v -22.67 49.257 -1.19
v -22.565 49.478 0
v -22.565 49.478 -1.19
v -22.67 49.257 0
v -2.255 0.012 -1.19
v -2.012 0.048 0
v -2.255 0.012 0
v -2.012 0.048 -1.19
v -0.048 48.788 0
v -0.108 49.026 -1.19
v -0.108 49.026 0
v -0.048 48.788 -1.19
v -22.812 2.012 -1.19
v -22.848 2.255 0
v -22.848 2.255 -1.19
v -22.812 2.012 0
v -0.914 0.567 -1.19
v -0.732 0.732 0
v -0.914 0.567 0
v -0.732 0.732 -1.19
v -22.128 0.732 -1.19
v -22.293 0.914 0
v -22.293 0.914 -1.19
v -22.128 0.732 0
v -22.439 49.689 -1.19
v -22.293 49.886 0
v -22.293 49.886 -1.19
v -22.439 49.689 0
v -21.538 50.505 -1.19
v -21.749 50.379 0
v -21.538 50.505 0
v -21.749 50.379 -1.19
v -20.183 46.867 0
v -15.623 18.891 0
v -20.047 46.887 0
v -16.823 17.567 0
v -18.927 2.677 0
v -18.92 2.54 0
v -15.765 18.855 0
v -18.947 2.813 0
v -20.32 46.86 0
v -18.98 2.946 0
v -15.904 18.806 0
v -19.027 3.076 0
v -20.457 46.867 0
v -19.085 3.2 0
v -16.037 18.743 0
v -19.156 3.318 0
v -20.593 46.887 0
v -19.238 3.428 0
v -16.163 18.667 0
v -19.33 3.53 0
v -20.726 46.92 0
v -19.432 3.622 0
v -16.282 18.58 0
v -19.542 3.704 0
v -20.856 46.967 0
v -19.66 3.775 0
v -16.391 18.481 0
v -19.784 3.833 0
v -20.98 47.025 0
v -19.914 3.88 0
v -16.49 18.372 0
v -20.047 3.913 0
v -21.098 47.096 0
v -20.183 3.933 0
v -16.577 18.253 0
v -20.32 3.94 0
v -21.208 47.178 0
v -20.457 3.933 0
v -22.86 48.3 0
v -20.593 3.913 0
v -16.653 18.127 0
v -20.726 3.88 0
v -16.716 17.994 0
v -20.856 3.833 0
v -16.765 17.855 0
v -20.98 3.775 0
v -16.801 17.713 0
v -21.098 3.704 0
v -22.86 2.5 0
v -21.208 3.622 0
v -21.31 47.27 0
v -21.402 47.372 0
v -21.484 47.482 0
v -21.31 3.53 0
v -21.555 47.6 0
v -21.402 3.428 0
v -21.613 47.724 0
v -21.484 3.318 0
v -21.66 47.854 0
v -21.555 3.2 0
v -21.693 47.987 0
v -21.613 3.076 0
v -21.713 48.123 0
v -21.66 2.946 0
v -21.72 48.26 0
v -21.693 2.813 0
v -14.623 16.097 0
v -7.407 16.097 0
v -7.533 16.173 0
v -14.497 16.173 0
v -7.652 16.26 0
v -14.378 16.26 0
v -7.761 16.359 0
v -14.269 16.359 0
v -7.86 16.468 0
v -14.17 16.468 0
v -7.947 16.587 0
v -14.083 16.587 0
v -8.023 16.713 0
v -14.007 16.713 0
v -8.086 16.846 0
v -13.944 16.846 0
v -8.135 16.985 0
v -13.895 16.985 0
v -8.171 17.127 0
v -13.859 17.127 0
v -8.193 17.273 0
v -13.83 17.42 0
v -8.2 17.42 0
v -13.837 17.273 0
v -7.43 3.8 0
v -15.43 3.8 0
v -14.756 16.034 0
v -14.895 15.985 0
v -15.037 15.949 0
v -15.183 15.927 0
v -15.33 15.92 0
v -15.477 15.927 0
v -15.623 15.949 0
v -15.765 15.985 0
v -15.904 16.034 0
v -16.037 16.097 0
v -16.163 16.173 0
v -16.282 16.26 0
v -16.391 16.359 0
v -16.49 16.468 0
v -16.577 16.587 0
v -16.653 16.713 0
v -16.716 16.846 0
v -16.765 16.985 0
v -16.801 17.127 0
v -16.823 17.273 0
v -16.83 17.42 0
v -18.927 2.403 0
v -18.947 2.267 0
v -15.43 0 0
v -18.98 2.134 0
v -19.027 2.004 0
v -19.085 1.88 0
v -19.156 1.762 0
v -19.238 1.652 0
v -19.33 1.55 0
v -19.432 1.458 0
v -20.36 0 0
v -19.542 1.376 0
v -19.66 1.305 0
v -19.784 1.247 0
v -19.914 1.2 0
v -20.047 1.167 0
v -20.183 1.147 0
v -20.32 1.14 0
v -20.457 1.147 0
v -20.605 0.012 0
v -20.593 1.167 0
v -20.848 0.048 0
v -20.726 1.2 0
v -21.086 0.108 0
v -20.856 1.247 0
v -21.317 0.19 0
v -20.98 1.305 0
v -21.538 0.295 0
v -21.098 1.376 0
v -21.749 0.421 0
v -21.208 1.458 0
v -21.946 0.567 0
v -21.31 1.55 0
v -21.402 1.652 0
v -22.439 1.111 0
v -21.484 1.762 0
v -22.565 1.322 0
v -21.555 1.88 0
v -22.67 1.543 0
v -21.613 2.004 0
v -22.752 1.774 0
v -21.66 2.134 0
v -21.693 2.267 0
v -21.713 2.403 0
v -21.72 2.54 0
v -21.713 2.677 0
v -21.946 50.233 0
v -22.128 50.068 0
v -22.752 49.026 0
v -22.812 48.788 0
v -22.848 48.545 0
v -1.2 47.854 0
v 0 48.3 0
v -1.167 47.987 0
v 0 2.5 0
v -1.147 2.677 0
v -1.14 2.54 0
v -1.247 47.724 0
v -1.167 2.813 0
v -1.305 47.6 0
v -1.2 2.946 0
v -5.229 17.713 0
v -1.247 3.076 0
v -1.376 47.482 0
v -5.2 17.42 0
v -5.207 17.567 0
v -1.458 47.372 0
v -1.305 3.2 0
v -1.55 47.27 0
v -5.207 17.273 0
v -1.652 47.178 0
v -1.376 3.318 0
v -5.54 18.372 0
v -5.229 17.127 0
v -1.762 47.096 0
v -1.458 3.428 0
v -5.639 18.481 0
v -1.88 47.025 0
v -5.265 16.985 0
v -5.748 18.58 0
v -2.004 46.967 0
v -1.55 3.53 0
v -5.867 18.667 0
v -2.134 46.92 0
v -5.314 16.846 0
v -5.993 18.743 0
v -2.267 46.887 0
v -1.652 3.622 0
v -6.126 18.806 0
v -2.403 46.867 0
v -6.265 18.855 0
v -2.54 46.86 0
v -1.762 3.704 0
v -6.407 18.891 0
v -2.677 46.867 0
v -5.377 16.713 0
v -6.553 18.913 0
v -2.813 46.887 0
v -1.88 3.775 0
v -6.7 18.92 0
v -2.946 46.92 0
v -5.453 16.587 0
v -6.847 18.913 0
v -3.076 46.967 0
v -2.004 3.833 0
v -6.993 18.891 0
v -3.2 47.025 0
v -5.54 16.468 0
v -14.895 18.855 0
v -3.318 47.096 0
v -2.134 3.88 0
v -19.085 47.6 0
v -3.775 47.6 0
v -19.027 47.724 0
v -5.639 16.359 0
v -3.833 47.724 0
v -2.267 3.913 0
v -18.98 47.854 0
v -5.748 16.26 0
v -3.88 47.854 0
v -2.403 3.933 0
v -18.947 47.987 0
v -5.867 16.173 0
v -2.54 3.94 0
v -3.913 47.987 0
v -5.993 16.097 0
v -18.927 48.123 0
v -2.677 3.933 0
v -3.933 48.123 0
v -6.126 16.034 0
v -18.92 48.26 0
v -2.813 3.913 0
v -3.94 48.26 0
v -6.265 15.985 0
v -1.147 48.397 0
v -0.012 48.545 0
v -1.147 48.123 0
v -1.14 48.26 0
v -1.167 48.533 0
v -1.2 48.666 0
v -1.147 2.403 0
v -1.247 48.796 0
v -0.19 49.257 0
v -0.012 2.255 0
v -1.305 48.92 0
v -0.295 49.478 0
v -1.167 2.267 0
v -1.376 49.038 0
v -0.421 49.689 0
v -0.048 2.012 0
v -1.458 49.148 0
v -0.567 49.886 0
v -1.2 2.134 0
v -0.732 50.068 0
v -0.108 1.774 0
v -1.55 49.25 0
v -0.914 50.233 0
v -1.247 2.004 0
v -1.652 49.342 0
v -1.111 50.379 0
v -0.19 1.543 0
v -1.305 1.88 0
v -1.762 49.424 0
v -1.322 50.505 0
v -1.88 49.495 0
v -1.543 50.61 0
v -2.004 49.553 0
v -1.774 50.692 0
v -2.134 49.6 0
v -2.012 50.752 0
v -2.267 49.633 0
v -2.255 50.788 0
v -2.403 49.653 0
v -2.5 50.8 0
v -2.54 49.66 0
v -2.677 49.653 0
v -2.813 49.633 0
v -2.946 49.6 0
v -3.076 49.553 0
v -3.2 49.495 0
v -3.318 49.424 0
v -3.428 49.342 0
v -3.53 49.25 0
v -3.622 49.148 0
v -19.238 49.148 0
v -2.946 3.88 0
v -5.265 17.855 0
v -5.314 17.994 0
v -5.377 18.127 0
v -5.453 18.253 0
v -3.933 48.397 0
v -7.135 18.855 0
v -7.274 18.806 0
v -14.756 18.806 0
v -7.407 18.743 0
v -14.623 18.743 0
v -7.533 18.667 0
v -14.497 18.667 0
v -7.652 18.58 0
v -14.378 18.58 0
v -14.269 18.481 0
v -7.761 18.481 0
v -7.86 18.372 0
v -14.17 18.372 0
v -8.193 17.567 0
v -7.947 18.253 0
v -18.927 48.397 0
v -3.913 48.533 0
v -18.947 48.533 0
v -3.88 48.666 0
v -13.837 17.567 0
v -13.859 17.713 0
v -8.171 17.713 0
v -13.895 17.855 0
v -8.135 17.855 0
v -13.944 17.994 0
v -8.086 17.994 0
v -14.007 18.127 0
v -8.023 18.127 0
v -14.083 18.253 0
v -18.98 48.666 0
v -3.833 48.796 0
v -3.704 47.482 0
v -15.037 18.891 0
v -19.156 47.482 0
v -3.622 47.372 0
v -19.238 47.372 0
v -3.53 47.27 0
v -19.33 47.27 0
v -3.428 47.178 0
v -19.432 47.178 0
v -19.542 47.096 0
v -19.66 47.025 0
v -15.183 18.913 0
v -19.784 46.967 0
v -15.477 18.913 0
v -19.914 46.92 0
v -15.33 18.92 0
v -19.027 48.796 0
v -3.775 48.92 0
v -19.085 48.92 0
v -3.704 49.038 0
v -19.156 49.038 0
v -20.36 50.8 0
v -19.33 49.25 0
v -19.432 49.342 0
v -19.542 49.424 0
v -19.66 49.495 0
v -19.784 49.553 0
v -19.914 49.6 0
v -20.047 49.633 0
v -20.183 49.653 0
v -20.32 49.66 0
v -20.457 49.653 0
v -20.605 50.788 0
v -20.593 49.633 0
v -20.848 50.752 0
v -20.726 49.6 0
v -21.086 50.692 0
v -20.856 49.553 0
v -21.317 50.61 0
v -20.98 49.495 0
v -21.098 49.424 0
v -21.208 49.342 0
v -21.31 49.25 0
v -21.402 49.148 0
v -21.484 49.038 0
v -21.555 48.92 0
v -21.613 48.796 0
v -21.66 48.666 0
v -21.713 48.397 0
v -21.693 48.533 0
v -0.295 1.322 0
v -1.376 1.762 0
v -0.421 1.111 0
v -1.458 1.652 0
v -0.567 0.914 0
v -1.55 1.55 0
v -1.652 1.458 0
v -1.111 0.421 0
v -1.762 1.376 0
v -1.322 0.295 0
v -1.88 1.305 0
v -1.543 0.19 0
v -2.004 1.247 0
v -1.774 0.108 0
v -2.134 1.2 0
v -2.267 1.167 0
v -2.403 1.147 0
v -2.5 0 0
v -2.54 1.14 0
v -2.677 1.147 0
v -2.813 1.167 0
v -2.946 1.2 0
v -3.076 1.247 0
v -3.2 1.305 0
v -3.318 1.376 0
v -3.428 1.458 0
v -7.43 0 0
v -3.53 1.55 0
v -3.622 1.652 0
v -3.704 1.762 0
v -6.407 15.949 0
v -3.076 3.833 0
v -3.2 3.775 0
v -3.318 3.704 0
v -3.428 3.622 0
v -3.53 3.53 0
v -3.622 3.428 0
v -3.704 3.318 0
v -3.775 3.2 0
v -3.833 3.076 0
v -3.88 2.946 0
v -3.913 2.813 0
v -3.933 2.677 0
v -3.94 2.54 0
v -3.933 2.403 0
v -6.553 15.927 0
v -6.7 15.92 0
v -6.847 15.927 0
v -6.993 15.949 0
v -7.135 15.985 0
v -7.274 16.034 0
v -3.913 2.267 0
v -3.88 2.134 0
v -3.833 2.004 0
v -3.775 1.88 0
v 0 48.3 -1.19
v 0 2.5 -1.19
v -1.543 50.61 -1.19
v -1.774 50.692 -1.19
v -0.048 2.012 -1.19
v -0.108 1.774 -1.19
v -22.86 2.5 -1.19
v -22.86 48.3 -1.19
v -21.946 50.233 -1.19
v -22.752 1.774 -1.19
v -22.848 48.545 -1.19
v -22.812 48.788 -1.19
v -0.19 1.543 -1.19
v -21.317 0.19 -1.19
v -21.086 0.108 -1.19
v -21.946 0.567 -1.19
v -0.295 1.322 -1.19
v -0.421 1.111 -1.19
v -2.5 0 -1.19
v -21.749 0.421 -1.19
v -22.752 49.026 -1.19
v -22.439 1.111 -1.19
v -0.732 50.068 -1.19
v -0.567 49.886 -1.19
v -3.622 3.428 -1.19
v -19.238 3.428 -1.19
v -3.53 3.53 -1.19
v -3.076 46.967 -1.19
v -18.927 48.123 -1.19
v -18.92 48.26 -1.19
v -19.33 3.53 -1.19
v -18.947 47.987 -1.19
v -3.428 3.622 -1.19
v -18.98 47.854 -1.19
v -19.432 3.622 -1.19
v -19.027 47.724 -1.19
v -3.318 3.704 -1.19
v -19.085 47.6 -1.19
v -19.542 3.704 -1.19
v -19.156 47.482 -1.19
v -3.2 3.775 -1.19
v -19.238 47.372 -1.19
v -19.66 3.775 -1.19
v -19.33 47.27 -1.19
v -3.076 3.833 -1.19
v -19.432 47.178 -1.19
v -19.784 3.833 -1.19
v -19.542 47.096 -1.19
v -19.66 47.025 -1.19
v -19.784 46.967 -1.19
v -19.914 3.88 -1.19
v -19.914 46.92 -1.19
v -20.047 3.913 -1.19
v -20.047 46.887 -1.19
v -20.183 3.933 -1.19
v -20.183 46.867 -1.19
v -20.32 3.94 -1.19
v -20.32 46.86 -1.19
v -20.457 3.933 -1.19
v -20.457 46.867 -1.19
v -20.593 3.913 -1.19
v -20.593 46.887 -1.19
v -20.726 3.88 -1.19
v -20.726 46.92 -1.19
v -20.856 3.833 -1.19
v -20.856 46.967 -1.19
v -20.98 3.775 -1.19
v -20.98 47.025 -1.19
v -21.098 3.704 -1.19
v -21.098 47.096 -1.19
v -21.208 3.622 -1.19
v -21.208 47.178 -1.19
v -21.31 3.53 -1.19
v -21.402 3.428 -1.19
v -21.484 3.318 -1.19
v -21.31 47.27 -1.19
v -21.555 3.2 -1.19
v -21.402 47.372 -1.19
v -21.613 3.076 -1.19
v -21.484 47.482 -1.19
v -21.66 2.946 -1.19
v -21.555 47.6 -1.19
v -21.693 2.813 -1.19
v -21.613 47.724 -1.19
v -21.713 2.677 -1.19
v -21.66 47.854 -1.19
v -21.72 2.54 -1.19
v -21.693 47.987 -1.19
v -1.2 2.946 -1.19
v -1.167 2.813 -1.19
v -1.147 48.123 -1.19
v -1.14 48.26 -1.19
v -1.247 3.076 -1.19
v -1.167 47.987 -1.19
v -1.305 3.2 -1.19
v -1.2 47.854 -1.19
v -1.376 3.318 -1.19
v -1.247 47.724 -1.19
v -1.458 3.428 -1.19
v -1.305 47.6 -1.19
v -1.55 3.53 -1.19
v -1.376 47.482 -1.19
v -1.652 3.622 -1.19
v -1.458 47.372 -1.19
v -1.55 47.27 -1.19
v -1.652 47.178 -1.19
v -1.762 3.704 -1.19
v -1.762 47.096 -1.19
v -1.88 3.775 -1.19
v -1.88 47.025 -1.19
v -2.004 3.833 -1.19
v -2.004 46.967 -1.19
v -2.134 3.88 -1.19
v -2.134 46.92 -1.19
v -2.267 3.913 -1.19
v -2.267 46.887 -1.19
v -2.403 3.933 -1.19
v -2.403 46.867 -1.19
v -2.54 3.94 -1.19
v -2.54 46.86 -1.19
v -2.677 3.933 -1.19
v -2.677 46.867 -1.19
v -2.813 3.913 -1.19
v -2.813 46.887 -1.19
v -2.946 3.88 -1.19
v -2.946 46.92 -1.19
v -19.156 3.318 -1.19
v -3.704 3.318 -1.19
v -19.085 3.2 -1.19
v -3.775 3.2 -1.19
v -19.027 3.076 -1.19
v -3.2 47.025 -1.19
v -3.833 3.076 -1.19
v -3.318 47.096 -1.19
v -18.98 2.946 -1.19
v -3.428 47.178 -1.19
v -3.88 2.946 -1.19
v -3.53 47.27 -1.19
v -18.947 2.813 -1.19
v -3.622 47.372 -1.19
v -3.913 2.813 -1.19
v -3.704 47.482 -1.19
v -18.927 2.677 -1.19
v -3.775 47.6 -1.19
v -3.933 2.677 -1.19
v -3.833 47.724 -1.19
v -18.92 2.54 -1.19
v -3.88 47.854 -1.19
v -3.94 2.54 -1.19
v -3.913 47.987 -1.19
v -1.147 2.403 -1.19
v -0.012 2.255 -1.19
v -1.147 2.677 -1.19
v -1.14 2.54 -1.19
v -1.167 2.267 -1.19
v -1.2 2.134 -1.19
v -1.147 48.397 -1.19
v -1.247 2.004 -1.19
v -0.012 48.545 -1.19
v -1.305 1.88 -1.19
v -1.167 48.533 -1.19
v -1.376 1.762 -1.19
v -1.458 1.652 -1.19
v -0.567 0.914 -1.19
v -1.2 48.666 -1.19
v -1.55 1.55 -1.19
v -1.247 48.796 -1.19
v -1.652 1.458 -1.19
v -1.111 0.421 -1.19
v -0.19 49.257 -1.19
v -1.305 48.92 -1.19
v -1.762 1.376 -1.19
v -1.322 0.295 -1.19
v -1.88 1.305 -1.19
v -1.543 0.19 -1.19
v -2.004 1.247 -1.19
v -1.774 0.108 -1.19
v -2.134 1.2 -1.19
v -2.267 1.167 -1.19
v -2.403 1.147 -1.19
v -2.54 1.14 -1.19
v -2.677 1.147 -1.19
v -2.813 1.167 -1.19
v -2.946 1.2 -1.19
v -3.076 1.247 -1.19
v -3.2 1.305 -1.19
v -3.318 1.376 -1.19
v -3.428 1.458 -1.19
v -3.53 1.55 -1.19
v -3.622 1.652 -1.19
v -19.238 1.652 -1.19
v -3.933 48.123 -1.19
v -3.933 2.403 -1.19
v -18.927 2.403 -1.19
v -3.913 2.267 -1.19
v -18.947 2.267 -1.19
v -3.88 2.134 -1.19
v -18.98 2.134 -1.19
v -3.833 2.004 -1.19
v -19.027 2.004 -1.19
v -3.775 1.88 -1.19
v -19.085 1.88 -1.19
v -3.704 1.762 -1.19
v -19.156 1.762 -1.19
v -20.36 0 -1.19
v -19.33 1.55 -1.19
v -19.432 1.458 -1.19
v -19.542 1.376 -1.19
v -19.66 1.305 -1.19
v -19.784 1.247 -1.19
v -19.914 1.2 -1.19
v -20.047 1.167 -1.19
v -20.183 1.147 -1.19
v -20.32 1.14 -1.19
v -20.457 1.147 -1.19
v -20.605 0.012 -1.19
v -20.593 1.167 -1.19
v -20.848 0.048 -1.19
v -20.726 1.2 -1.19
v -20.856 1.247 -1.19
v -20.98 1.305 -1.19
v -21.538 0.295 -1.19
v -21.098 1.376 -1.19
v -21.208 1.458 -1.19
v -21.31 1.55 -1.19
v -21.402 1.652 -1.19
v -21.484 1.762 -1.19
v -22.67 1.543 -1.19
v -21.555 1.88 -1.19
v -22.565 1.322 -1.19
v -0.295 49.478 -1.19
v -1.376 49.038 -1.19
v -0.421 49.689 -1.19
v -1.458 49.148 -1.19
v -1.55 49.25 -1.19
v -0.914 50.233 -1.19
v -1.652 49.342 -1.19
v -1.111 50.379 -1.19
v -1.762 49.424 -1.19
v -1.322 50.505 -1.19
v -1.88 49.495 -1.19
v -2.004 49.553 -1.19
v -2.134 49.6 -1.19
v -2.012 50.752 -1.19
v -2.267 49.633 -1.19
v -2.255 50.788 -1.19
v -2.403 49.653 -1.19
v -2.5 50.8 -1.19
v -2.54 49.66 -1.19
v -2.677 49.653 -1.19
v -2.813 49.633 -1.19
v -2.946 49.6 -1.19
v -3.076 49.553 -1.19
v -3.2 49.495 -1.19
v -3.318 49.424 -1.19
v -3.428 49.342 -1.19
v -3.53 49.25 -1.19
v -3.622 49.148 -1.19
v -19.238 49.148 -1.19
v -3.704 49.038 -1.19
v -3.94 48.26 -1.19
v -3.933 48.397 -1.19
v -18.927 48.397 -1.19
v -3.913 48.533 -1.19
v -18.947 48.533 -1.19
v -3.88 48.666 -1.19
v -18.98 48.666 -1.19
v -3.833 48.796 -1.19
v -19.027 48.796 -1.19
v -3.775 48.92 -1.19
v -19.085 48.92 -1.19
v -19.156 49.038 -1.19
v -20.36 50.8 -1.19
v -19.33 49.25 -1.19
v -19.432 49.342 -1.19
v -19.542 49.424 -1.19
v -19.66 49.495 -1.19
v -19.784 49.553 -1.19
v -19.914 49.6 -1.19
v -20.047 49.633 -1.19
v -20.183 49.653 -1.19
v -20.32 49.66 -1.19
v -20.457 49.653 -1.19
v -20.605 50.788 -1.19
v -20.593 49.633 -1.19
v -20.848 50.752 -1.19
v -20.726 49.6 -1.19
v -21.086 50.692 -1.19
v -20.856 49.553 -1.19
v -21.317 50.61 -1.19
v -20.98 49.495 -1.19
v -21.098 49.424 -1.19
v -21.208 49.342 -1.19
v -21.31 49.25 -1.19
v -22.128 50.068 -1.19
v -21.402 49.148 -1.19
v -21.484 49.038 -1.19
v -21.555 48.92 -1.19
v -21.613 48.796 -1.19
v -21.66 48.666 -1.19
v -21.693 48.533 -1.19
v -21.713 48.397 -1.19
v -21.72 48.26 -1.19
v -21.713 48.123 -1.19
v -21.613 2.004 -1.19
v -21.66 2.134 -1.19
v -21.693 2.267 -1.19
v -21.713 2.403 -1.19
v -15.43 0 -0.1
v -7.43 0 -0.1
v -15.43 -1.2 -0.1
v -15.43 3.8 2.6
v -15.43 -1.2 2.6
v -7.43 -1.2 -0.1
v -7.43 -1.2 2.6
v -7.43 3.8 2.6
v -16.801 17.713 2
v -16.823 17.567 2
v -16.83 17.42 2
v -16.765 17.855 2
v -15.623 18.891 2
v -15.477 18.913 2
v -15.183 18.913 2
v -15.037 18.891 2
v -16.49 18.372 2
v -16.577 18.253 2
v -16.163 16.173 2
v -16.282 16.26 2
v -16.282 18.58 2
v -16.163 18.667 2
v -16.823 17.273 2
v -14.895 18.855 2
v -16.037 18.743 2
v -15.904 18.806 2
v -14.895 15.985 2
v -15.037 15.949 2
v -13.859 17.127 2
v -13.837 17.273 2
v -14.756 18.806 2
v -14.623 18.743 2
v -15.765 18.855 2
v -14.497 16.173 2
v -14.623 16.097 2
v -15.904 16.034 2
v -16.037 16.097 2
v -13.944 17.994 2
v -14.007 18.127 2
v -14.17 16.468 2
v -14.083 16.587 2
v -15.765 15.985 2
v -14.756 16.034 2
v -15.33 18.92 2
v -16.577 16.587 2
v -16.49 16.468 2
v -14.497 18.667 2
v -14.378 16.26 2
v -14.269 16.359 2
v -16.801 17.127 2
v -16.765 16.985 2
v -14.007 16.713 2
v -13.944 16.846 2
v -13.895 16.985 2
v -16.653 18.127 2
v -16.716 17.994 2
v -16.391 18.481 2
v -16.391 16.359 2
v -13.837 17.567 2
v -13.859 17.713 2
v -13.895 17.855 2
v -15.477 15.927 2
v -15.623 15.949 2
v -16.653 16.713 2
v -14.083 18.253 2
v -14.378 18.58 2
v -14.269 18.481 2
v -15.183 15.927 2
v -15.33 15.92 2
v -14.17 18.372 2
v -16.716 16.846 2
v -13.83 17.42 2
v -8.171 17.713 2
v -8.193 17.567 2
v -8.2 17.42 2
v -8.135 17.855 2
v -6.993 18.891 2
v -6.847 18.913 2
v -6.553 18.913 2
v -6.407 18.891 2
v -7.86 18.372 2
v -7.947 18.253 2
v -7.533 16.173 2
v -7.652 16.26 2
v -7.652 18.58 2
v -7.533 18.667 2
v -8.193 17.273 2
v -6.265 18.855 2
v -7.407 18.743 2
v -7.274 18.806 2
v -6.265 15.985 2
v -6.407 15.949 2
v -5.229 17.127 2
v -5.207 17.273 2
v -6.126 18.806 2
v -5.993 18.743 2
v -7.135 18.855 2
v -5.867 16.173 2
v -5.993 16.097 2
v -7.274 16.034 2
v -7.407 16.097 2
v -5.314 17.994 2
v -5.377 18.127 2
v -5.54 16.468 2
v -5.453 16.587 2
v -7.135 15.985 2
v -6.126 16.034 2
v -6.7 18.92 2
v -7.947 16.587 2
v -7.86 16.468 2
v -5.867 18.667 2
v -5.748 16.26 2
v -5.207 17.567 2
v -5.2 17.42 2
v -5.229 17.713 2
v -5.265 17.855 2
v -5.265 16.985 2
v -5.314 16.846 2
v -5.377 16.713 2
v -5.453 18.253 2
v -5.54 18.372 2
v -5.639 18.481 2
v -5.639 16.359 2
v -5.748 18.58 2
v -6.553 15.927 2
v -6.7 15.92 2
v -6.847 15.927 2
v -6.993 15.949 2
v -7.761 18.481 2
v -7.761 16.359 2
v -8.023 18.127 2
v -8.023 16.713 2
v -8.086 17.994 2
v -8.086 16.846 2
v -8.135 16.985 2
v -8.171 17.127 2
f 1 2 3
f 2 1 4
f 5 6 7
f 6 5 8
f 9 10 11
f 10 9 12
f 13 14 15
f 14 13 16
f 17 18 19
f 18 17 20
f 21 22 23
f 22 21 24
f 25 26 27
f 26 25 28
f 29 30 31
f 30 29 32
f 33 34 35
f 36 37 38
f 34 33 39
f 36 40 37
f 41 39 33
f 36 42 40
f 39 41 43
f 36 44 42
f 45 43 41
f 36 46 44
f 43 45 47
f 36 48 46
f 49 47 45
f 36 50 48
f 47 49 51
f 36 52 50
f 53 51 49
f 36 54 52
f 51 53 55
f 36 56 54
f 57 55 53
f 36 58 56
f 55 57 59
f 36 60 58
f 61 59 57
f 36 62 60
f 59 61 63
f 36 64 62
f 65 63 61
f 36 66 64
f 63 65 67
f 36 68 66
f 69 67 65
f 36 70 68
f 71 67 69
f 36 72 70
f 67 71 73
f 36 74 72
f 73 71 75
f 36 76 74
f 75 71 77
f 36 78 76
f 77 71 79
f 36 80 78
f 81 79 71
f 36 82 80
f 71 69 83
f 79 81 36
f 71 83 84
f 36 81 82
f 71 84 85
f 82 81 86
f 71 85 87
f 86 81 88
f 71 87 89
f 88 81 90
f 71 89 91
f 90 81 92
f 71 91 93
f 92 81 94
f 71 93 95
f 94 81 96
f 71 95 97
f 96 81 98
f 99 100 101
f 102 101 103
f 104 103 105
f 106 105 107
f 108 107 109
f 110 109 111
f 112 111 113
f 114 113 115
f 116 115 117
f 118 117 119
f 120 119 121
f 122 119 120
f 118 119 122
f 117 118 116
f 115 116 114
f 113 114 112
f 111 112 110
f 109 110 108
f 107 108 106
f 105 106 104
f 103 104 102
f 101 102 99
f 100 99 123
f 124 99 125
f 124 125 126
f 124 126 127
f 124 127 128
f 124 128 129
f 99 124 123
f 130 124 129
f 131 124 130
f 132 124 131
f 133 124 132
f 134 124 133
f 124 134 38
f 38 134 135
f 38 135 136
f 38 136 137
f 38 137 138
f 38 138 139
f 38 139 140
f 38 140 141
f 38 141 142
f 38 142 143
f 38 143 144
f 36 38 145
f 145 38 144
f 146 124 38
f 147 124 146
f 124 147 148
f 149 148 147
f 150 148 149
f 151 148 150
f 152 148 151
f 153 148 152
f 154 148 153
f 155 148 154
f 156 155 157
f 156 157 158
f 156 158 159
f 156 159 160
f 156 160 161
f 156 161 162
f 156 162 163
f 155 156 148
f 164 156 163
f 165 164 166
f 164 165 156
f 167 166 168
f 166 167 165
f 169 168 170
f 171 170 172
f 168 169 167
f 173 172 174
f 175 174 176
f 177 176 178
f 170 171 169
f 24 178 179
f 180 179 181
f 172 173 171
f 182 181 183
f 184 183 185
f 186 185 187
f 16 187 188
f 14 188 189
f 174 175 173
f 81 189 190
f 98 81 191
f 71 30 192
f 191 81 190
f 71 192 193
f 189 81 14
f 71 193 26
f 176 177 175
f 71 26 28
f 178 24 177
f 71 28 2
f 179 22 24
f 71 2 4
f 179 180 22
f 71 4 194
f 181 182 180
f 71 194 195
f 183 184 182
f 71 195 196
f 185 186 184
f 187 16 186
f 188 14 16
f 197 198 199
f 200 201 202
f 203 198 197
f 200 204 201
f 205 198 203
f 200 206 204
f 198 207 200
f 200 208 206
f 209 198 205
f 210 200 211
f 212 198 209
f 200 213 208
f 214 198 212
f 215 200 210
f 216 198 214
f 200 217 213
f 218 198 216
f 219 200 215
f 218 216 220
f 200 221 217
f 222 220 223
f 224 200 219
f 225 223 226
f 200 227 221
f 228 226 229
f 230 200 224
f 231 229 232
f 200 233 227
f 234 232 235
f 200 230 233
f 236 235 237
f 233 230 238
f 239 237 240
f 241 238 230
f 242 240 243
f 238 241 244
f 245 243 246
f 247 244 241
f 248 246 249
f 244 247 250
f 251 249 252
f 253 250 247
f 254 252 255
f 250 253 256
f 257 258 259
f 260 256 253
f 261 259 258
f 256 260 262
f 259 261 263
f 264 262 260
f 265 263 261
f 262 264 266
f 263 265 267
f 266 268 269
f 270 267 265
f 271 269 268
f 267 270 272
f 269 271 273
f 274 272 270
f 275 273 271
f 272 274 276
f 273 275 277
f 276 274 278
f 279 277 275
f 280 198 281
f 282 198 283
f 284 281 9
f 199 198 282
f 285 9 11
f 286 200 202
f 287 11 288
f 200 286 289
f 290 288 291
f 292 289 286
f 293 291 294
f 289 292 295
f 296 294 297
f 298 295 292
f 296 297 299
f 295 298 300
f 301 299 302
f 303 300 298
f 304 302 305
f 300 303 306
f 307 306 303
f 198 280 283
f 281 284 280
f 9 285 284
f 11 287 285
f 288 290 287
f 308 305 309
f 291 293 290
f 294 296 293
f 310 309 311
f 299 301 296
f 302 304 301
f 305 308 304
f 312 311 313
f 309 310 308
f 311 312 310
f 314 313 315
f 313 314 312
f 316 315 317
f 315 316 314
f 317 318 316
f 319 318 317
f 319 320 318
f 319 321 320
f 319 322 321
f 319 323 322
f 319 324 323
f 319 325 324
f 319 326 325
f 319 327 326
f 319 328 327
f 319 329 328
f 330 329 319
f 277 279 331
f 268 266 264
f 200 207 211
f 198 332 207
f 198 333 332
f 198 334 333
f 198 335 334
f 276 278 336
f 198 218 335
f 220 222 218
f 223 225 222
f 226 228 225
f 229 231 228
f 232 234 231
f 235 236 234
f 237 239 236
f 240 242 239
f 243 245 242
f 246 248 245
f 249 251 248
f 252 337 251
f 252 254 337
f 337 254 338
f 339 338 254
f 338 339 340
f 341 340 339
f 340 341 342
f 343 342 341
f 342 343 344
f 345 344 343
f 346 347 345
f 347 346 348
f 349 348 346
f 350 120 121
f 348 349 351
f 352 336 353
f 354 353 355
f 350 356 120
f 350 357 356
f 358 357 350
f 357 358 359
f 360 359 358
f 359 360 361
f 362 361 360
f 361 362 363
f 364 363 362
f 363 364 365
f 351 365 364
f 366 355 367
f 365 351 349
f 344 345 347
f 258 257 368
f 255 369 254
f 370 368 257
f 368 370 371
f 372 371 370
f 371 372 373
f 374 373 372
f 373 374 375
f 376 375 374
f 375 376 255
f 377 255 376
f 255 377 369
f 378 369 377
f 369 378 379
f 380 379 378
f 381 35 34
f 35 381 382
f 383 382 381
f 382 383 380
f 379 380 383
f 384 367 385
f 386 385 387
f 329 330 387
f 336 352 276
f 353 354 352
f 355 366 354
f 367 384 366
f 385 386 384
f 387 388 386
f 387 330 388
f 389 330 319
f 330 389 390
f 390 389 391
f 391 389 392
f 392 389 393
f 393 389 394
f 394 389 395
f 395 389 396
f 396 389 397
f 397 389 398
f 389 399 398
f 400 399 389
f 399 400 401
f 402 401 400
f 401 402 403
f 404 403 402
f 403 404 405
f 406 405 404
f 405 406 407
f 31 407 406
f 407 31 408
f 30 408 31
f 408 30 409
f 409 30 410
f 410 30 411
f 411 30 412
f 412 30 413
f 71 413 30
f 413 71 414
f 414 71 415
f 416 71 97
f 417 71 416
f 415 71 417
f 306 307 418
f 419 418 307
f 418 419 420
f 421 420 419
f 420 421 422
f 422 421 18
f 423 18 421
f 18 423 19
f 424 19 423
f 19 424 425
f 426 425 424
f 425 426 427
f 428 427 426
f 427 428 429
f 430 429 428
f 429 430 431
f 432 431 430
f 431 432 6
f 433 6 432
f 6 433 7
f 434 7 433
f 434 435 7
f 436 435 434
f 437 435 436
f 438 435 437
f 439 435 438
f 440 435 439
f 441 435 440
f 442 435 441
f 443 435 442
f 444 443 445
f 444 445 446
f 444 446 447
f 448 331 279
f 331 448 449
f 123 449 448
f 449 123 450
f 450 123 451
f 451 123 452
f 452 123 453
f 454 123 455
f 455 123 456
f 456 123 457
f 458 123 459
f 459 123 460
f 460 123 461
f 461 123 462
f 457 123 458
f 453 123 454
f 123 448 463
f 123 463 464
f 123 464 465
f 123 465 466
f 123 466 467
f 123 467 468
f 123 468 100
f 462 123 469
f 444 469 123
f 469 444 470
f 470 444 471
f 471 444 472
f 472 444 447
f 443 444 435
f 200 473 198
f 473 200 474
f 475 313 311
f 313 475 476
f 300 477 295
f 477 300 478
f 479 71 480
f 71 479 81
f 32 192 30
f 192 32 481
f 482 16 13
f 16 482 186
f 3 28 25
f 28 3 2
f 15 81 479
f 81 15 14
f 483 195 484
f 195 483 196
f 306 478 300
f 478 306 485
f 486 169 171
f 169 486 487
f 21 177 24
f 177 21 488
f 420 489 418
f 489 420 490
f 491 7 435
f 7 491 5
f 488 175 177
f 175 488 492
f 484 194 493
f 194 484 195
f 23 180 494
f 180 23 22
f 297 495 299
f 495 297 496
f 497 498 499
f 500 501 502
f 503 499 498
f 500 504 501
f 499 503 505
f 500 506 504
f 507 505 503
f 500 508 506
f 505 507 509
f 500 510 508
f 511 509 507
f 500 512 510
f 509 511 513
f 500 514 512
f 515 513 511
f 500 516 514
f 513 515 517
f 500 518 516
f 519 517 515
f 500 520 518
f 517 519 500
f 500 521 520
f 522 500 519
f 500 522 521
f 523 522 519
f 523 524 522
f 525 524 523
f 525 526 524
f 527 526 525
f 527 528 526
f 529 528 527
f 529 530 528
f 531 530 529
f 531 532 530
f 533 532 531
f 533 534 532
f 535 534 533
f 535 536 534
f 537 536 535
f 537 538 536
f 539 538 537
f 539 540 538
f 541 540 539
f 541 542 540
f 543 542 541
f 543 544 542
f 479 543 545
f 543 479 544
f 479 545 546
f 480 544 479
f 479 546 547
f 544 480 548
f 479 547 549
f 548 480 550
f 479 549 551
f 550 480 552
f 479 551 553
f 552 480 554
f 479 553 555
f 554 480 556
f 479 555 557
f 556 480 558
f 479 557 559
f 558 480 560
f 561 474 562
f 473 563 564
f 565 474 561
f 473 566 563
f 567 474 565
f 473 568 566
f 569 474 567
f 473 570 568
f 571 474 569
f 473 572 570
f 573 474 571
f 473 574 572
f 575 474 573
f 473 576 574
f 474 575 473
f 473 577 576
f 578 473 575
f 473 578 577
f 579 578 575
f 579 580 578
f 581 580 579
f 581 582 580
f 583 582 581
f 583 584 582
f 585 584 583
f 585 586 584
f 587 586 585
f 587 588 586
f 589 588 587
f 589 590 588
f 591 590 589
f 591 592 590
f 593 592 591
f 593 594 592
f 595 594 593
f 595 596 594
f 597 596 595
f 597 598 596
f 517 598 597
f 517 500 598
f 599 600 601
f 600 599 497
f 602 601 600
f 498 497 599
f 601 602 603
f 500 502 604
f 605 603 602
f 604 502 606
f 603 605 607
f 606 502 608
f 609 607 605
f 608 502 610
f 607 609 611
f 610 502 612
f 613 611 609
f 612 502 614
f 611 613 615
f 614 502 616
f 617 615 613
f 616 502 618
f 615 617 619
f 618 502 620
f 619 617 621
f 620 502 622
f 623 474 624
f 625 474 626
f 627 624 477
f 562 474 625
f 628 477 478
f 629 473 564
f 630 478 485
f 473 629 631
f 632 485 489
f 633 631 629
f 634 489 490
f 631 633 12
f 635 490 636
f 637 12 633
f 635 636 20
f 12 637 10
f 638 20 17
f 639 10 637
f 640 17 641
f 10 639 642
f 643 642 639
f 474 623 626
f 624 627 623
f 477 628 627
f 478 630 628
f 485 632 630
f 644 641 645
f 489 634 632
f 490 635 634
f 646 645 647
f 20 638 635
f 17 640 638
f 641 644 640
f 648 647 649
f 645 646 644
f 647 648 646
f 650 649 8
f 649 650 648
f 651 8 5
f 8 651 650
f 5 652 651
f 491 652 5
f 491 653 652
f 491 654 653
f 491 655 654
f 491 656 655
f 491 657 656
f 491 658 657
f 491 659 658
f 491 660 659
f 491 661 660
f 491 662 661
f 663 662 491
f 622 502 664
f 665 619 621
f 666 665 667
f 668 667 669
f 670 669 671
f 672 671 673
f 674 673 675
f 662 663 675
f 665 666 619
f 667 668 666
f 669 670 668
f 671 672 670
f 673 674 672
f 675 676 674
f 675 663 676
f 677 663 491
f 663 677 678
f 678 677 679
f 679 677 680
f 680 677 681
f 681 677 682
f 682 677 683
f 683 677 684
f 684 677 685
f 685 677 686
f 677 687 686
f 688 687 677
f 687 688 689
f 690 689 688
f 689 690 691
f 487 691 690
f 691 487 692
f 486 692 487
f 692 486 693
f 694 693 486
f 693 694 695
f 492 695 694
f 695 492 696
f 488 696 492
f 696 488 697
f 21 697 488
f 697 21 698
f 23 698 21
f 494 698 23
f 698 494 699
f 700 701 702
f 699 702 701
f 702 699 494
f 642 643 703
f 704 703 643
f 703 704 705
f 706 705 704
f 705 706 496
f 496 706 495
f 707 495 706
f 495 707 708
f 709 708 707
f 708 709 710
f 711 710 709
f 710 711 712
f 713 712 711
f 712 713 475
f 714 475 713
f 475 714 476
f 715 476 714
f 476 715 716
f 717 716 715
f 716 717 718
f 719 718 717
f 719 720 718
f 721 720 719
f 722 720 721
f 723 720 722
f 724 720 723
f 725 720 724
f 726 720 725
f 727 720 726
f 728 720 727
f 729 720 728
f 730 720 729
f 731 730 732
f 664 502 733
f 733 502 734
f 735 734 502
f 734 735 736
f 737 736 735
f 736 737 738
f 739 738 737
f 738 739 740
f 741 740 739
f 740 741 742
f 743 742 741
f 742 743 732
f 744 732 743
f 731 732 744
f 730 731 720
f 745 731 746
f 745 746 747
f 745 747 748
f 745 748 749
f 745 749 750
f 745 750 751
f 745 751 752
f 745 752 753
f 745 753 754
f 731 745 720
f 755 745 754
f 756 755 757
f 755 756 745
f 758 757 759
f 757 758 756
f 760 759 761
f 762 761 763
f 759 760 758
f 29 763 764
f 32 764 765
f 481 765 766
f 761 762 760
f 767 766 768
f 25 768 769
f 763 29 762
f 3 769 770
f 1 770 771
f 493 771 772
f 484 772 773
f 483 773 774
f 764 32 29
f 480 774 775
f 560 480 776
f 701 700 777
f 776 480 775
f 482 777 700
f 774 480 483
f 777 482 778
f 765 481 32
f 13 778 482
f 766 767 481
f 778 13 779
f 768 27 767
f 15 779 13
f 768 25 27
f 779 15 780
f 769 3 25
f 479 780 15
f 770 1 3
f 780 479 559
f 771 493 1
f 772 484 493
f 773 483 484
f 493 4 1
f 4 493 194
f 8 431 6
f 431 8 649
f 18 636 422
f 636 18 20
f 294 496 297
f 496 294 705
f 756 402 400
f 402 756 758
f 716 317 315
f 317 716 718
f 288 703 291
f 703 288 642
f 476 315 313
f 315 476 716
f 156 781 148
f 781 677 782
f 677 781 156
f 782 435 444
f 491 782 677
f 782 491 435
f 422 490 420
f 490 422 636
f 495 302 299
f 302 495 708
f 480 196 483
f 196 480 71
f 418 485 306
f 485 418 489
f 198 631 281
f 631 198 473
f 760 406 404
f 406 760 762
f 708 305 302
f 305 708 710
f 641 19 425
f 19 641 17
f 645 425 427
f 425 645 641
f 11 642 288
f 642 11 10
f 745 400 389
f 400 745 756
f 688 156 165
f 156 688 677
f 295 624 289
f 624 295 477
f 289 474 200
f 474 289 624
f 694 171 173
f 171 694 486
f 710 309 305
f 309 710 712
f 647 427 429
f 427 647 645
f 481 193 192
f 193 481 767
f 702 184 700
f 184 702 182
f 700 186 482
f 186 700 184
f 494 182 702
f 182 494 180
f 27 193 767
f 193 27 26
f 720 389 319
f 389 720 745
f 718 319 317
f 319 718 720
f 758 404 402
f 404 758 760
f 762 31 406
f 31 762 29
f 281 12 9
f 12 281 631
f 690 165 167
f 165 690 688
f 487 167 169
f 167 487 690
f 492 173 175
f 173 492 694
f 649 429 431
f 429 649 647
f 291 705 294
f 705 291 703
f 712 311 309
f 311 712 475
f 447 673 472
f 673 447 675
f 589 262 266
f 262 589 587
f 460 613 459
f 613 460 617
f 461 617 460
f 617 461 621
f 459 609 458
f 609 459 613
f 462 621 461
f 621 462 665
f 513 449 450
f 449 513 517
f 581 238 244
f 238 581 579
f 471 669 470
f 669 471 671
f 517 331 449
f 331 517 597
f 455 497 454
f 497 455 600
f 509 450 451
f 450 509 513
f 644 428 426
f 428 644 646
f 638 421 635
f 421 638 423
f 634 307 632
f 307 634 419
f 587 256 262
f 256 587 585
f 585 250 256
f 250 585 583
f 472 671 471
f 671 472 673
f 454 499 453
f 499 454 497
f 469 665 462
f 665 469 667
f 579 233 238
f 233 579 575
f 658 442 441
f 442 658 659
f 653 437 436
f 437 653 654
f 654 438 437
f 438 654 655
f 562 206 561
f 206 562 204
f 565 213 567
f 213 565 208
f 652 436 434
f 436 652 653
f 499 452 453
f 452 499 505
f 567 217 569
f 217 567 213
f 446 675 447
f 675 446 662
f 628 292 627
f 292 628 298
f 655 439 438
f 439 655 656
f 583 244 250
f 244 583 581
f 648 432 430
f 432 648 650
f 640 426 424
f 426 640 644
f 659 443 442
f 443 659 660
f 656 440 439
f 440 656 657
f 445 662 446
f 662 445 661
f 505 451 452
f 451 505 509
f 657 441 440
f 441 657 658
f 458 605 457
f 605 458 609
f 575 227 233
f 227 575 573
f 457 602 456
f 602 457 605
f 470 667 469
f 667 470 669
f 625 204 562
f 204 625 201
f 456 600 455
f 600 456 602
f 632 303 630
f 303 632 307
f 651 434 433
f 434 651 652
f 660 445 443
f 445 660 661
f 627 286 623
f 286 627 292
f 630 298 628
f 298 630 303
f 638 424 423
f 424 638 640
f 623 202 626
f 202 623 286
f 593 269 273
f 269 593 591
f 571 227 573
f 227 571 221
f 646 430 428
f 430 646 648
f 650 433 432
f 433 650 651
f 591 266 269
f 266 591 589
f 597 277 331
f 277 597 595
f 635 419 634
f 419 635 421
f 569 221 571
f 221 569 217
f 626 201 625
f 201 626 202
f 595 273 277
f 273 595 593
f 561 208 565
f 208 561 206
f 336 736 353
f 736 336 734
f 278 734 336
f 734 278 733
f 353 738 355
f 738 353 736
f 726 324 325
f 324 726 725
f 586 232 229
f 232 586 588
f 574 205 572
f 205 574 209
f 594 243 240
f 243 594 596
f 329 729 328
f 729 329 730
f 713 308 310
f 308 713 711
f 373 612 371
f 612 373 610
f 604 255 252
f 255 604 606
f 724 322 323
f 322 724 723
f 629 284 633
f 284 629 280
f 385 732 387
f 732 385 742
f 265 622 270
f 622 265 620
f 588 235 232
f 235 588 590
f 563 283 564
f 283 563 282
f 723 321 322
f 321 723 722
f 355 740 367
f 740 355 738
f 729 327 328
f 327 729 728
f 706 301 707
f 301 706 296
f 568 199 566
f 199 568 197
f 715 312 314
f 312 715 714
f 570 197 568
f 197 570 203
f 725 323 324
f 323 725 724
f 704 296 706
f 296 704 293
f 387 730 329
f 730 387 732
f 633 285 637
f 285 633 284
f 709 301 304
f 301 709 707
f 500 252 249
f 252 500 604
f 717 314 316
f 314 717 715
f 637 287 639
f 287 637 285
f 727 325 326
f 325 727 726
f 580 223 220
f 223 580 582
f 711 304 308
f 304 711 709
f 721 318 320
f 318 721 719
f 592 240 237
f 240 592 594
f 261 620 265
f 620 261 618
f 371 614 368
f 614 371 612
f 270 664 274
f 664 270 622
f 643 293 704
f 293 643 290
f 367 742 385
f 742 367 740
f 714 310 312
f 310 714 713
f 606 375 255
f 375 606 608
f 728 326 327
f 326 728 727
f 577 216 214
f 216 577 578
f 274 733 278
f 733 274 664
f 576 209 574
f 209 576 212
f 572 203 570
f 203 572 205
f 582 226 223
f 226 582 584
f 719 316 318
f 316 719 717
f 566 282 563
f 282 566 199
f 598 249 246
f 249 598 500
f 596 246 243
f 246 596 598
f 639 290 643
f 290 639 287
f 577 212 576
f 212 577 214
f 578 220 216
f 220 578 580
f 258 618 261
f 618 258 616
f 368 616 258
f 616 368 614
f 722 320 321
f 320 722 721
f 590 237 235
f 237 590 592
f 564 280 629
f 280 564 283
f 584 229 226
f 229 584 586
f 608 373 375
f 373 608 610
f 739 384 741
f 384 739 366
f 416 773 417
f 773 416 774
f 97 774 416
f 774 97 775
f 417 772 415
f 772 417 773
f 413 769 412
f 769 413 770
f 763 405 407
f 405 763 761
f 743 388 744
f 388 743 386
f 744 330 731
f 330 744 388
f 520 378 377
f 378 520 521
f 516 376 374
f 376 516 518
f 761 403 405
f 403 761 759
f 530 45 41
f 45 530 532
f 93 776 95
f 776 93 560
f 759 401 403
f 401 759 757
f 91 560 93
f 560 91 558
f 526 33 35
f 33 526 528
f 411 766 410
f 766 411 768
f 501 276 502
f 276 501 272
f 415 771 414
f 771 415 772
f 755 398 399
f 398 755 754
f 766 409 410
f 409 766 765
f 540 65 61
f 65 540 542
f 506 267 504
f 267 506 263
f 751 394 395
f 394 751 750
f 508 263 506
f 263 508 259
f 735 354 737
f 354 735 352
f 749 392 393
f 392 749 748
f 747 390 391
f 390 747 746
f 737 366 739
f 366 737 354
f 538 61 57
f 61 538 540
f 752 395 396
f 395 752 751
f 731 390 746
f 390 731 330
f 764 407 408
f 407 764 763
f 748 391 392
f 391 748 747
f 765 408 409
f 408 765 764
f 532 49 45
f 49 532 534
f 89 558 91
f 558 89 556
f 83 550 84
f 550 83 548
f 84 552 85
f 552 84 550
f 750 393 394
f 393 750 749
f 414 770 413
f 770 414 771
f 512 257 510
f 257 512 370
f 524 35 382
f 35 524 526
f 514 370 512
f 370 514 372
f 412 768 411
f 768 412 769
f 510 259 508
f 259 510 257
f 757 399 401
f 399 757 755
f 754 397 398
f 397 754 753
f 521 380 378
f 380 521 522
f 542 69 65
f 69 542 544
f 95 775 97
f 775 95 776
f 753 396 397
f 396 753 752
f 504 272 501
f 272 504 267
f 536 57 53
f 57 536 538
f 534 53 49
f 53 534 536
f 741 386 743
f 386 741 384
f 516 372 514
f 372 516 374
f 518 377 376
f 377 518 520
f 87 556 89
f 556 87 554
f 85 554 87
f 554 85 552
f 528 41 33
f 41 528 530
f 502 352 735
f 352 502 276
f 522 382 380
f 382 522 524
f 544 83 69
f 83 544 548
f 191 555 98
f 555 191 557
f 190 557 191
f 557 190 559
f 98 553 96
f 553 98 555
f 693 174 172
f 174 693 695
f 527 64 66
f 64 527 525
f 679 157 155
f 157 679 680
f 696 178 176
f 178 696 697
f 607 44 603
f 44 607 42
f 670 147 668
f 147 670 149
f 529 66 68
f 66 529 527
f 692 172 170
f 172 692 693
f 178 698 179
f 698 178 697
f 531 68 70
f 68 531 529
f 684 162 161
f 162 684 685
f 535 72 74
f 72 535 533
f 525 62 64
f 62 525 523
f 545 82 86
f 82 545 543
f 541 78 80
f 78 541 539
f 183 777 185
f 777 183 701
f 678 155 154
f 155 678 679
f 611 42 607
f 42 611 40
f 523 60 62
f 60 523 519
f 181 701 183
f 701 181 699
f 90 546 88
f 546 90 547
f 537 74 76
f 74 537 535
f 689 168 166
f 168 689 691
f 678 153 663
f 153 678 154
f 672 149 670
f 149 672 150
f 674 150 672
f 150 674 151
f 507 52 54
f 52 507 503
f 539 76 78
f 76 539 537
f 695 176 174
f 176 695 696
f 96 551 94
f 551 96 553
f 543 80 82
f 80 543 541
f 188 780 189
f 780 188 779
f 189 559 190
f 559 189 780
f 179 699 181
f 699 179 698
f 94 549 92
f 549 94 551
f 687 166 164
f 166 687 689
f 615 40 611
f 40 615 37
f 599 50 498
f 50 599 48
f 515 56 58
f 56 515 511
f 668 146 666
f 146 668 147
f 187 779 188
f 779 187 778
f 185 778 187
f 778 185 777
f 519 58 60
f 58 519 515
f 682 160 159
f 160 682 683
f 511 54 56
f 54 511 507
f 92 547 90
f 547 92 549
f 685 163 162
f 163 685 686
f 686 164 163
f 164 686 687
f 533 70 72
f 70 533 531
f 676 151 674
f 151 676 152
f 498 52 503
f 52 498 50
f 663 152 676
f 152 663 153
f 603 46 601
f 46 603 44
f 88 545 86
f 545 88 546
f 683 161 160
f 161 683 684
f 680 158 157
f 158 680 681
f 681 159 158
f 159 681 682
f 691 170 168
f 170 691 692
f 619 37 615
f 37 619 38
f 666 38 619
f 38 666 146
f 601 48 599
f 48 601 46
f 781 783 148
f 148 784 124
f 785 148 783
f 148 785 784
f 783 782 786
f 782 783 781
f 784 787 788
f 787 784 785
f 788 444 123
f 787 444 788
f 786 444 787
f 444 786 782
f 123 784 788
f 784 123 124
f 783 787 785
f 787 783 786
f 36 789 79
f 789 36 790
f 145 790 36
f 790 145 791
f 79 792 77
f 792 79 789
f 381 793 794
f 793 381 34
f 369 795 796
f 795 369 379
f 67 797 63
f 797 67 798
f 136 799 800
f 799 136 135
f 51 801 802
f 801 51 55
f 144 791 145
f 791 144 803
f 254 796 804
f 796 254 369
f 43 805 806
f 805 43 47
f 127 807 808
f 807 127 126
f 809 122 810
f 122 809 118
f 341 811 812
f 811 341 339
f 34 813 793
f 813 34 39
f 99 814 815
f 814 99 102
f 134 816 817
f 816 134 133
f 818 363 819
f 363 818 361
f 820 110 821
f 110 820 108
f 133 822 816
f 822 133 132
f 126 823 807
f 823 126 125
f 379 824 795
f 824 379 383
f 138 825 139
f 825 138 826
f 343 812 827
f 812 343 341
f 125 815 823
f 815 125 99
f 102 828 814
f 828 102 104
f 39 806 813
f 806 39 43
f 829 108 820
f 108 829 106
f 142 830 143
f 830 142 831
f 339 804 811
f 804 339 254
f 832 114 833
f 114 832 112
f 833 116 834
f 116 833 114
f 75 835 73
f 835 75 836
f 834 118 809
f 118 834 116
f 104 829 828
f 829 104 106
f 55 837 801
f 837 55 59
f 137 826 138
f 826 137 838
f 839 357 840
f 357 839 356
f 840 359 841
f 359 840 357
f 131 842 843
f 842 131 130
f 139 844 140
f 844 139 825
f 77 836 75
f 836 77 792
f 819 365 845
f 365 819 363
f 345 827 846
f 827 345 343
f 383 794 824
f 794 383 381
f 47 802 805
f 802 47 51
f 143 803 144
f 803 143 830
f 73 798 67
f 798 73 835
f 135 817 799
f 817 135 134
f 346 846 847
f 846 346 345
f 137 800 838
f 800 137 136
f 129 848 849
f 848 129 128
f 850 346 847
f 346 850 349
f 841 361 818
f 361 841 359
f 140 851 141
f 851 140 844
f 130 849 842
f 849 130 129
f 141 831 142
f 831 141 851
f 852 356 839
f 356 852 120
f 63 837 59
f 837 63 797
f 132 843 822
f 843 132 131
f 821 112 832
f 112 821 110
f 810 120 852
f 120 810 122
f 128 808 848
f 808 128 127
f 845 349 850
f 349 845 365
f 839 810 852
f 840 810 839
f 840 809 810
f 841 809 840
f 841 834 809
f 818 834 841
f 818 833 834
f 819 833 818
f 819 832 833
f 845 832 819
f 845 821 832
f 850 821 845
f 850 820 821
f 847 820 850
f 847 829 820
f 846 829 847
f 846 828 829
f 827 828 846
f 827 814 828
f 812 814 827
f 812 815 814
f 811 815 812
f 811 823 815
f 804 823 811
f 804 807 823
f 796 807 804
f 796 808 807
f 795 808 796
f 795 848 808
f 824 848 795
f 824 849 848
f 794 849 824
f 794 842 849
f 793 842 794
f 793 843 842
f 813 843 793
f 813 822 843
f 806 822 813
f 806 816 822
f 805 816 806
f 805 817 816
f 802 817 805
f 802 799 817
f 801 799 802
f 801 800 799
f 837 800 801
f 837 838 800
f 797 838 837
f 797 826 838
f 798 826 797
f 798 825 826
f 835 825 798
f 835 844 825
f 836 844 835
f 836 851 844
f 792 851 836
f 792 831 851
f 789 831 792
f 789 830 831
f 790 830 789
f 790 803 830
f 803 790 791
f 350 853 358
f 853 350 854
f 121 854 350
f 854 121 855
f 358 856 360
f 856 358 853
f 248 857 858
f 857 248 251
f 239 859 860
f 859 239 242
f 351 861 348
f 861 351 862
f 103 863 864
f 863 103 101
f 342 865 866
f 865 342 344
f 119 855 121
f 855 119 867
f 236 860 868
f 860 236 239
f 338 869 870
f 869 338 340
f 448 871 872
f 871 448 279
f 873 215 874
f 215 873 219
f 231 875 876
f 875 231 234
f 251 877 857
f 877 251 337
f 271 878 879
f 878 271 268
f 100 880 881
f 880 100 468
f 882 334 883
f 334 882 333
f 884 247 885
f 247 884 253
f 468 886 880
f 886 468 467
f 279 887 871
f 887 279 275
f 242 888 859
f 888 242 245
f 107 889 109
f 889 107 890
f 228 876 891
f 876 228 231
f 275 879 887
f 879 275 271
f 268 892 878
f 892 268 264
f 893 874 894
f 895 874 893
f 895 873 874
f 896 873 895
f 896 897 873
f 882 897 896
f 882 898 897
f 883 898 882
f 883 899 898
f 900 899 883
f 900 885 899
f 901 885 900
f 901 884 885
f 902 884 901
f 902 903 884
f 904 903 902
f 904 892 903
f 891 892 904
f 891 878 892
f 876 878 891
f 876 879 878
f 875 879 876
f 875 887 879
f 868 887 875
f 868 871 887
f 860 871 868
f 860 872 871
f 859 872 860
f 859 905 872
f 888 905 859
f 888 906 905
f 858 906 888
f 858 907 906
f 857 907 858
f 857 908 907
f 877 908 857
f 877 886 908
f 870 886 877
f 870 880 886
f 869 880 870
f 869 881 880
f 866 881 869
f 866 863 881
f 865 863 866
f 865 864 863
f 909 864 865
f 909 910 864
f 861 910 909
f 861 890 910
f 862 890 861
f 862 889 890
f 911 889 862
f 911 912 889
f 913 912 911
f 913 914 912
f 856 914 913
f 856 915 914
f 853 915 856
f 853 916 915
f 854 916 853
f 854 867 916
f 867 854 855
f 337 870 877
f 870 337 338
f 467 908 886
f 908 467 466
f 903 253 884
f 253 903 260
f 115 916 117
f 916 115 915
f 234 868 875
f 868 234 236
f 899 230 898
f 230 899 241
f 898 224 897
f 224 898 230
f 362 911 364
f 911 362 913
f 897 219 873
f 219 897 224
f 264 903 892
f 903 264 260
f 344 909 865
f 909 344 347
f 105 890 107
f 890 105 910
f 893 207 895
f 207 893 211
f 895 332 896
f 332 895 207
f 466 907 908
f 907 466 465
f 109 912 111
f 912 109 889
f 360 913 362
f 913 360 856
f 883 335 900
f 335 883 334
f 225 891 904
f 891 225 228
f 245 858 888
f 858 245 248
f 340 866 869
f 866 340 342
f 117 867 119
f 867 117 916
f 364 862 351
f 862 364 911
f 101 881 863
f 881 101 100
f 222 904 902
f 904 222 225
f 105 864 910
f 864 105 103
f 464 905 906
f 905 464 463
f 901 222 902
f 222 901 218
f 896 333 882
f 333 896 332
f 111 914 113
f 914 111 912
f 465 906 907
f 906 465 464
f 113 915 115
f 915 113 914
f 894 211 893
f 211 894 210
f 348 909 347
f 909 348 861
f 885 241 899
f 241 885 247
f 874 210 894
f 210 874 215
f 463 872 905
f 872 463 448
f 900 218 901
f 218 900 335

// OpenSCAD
$fn = 64; // curved resolution (used for cylinders and spheres)

rotate(180,[0,1,0]) featherBoard();

// Featherboard with usb
module featherBoard() {
    difference() {
        // PCB
        rcube([22.86,50.8,1.19], 2.5);
        // Holes for mounting
        translate([2.54,2.54,-2])cylinder(r=1.4, h=14);;
        translate([2.54,48.26,-2])cylinder(r=1.4, h=14);;
        translate([20.32,48.26,-2])cylinder(r=1.4, h=14);;
        translate([20.32,2.54,-2])cylinder(r=1.4, h=14);;
    }
    // Micro USB
    translate([7.43,-1.2,-2.6]) {
        cube([8, 5, 2.7]);
    }
    // Buttons
    translate([15.33,17.42,-2])cylinder(r=1.5, h=2);
    translate([6.7,17.42,-2])cylinder(r=1.5, h=2);
}

// Rounded rectangle
module rcube(size, radius) {
    // rcube module found here: https://www.prusaprinters.org/parametric-design-in-openscad/
    hull() {
        translate([radius, radius]) cylinder(r = radius, h = size[2]);
        translate([size[0] - radius, radius]) cylinder(r = radius, h = size[2]);
        translate([size[0] - radius, size[1] - radius]) cylinder(r = radius, h = size[2]);
        translate([radius, size[1] - radius]) cylinder(r = radius, h = size[2]);
        //translate([1, size[1] - 1]) cylinder(r = 1, h = size[2]);
    }
}
